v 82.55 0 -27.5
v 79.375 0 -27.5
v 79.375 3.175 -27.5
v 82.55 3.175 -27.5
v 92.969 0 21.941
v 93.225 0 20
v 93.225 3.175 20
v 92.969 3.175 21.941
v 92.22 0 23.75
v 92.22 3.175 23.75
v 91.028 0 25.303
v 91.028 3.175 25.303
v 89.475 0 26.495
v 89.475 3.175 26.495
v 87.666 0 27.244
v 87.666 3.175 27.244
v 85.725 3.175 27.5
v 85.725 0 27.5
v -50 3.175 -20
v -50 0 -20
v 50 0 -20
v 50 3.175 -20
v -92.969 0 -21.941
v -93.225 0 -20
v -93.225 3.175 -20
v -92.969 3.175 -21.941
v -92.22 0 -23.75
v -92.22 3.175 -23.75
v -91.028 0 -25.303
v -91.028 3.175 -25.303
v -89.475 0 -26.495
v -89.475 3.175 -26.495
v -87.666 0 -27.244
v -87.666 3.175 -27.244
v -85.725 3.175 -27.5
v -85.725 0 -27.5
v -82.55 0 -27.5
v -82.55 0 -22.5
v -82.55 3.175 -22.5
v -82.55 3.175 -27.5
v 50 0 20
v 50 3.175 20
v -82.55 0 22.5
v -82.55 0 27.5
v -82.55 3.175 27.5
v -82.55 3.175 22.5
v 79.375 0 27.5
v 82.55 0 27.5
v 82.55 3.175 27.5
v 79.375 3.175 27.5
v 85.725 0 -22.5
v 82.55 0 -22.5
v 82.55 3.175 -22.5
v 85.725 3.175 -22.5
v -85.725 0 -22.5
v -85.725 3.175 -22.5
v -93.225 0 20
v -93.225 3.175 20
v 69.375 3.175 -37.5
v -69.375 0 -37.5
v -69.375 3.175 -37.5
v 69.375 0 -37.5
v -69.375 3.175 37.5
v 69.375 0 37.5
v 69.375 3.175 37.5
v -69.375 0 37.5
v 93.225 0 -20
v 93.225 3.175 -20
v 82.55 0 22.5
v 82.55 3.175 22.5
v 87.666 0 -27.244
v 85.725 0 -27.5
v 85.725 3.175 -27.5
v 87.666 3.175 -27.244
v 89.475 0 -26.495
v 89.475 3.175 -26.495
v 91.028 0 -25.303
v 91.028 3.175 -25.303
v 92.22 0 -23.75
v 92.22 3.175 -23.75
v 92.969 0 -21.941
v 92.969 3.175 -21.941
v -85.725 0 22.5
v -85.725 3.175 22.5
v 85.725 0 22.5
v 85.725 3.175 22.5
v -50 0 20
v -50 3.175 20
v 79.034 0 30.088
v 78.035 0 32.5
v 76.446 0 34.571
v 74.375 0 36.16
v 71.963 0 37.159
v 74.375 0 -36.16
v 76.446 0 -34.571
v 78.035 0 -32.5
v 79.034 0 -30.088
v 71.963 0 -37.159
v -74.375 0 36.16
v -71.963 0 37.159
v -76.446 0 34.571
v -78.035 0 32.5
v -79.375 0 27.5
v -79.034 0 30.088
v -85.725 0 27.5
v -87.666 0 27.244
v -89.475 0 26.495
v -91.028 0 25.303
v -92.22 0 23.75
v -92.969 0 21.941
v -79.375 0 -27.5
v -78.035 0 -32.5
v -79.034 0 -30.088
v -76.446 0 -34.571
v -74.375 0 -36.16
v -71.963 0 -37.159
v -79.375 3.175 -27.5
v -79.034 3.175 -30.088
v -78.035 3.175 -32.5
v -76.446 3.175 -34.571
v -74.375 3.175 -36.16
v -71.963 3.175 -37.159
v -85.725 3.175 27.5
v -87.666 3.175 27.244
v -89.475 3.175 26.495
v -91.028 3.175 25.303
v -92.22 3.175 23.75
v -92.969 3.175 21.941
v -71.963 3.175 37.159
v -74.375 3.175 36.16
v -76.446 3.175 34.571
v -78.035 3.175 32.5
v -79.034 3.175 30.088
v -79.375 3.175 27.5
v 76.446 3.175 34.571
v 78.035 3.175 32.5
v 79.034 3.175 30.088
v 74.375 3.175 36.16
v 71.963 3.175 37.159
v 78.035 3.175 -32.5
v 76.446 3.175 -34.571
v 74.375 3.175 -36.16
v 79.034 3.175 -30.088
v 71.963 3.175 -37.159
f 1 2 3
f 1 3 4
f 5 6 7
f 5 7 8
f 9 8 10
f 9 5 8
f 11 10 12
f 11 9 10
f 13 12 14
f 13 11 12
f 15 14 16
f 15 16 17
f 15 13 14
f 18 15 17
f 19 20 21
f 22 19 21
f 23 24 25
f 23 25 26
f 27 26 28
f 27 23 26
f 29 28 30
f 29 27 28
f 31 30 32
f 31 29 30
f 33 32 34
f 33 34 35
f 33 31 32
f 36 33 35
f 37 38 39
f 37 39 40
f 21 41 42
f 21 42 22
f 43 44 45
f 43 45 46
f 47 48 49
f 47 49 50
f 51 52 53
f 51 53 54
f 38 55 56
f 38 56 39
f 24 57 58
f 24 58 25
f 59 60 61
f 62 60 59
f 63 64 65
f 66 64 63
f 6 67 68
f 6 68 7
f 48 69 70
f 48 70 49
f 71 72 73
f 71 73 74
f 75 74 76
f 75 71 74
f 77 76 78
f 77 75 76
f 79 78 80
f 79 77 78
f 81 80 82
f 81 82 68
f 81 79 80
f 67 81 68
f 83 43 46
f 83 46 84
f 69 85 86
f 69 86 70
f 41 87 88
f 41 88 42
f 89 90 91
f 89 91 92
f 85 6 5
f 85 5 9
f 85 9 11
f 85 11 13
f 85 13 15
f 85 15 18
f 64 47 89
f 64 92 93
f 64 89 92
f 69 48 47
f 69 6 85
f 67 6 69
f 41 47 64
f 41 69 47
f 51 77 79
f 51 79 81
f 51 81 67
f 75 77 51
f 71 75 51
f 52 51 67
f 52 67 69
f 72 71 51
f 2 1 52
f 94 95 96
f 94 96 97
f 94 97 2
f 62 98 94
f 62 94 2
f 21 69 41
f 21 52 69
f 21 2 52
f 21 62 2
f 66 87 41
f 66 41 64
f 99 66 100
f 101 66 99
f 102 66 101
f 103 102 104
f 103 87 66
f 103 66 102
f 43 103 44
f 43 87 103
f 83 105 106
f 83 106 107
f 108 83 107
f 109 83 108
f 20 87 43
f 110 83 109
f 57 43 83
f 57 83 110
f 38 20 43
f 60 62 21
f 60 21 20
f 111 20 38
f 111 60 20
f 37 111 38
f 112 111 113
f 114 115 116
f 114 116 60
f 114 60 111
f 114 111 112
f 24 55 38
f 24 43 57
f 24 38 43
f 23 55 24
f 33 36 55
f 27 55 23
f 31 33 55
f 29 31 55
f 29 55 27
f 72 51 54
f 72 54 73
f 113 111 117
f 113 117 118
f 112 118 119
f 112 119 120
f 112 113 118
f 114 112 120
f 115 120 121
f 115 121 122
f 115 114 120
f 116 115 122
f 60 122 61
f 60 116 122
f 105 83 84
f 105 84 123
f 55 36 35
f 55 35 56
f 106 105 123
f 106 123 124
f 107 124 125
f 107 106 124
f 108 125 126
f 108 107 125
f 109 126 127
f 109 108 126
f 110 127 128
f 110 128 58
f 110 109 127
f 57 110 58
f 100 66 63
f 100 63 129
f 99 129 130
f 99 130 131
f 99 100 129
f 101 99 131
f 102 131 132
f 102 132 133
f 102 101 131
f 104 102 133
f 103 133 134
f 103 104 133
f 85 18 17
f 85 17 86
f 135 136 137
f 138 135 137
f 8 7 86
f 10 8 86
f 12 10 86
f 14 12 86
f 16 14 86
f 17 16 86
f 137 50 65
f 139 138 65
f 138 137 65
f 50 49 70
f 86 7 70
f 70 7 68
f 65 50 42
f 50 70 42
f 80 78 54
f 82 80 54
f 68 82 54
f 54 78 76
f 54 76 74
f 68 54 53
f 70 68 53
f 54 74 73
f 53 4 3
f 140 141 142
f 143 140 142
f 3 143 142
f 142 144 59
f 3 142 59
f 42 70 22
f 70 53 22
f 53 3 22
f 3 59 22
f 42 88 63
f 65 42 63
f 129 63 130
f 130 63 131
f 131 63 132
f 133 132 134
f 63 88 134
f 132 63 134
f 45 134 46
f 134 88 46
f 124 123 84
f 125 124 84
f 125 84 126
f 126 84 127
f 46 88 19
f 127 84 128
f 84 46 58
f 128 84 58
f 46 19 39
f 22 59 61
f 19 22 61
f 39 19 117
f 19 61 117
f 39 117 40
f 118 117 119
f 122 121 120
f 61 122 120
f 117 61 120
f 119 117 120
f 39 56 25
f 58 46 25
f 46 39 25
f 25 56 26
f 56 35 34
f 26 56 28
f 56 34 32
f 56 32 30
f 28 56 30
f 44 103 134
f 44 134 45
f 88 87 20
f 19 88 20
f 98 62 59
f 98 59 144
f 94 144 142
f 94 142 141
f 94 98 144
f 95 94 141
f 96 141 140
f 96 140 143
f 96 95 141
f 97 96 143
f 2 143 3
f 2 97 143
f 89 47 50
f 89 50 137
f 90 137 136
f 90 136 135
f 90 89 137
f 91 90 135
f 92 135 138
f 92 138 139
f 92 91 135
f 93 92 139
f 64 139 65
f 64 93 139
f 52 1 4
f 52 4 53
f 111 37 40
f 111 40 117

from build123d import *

# Parameters (mm, degrees)
SKETCH1_W           = 100
SKETCH1_H           = 40
BOSS_EXTRUDE2_DEPTH = 3.175


with BuildPart() as part:
    # Sketch1 → Boss-Extrude2 (new body)
    with BuildSketch(Plane(origin=(0, 0, 0), x_dir=(1, 0, 0), z_dir=(0, 1, 0))):
        with BuildLine():
            Line((-69.375, 37.5), (69.375, 37.5))
            ThreePointArc((69.375, 37.5), (76.446067812, 34.571067812), (79.375, 27.5))
            Line((79.375, 27.5), (82.55, 27.5))
            Line((82.55, 27.5), (82.55, 22.5))
            Line((82.55, 22.5), (85.725, 22.5))
            Line((85.725, 22.5), (85.725, 27.5))
            ThreePointArc((85.725, 27.5), (91.028300859, 25.303300859), (93.225, 20))
            Line((93.225, 20), (93.225, -20))
            ThreePointArc((93.225, -20), (91.028300859, -25.303300859), (85.725, -27.5))
            Line((85.725, -27.5), (85.725, -22.5))
            Line((85.725, -22.5), (82.55, -22.5))
            Line((82.55, -22.5), (82.55, -27.5))
            Line((82.55, -27.5), (79.375, -27.5))
            ThreePointArc((79.375, -27.5), (76.446067812, -34.571067812), (69.375, -37.5))
            Line((69.375, -37.5), (-69.375, -37.5))
            ThreePointArc((-69.375, -37.5), (-76.446067812, -34.571067812), (-79.375, -27.5))
            Line((-79.375, -27.5), (-82.55, -27.5))
            Line((-82.55, -27.5), (-82.55, -22.5))
            Line((-82.55, -22.5), (-85.725, -22.5))
            Line((-85.725, -22.5), (-85.725, -27.5))
            ThreePointArc((-85.725, -27.5), (-91.028300859, -25.303300859), (-93.225, -20))
            Line((-93.225, -20), (-93.225, 20))
            ThreePointArc((-93.225, 20), (-91.028300859, 25.303300859), (-85.725, 27.5))
            Line((-85.725, 27.5), (-85.725, 22.5))
            Line((-85.725, 22.5), (-82.55, 22.5))
            Line((-82.55, 22.5), (-82.55, 27.5))
            Line((-82.55, 27.5), (-79.375, 27.5))
            ThreePointArc((-79.375, 27.5), (-76.446067812, 34.571067812), (-69.375, 37.5))
        make_face()
        Rectangle(SKETCH1_W, SKETCH1_H, mode=Mode.SUBTRACT)
    extrude(amount=BOSS_EXTRUDE2_DEPTH)


solid = part.part
